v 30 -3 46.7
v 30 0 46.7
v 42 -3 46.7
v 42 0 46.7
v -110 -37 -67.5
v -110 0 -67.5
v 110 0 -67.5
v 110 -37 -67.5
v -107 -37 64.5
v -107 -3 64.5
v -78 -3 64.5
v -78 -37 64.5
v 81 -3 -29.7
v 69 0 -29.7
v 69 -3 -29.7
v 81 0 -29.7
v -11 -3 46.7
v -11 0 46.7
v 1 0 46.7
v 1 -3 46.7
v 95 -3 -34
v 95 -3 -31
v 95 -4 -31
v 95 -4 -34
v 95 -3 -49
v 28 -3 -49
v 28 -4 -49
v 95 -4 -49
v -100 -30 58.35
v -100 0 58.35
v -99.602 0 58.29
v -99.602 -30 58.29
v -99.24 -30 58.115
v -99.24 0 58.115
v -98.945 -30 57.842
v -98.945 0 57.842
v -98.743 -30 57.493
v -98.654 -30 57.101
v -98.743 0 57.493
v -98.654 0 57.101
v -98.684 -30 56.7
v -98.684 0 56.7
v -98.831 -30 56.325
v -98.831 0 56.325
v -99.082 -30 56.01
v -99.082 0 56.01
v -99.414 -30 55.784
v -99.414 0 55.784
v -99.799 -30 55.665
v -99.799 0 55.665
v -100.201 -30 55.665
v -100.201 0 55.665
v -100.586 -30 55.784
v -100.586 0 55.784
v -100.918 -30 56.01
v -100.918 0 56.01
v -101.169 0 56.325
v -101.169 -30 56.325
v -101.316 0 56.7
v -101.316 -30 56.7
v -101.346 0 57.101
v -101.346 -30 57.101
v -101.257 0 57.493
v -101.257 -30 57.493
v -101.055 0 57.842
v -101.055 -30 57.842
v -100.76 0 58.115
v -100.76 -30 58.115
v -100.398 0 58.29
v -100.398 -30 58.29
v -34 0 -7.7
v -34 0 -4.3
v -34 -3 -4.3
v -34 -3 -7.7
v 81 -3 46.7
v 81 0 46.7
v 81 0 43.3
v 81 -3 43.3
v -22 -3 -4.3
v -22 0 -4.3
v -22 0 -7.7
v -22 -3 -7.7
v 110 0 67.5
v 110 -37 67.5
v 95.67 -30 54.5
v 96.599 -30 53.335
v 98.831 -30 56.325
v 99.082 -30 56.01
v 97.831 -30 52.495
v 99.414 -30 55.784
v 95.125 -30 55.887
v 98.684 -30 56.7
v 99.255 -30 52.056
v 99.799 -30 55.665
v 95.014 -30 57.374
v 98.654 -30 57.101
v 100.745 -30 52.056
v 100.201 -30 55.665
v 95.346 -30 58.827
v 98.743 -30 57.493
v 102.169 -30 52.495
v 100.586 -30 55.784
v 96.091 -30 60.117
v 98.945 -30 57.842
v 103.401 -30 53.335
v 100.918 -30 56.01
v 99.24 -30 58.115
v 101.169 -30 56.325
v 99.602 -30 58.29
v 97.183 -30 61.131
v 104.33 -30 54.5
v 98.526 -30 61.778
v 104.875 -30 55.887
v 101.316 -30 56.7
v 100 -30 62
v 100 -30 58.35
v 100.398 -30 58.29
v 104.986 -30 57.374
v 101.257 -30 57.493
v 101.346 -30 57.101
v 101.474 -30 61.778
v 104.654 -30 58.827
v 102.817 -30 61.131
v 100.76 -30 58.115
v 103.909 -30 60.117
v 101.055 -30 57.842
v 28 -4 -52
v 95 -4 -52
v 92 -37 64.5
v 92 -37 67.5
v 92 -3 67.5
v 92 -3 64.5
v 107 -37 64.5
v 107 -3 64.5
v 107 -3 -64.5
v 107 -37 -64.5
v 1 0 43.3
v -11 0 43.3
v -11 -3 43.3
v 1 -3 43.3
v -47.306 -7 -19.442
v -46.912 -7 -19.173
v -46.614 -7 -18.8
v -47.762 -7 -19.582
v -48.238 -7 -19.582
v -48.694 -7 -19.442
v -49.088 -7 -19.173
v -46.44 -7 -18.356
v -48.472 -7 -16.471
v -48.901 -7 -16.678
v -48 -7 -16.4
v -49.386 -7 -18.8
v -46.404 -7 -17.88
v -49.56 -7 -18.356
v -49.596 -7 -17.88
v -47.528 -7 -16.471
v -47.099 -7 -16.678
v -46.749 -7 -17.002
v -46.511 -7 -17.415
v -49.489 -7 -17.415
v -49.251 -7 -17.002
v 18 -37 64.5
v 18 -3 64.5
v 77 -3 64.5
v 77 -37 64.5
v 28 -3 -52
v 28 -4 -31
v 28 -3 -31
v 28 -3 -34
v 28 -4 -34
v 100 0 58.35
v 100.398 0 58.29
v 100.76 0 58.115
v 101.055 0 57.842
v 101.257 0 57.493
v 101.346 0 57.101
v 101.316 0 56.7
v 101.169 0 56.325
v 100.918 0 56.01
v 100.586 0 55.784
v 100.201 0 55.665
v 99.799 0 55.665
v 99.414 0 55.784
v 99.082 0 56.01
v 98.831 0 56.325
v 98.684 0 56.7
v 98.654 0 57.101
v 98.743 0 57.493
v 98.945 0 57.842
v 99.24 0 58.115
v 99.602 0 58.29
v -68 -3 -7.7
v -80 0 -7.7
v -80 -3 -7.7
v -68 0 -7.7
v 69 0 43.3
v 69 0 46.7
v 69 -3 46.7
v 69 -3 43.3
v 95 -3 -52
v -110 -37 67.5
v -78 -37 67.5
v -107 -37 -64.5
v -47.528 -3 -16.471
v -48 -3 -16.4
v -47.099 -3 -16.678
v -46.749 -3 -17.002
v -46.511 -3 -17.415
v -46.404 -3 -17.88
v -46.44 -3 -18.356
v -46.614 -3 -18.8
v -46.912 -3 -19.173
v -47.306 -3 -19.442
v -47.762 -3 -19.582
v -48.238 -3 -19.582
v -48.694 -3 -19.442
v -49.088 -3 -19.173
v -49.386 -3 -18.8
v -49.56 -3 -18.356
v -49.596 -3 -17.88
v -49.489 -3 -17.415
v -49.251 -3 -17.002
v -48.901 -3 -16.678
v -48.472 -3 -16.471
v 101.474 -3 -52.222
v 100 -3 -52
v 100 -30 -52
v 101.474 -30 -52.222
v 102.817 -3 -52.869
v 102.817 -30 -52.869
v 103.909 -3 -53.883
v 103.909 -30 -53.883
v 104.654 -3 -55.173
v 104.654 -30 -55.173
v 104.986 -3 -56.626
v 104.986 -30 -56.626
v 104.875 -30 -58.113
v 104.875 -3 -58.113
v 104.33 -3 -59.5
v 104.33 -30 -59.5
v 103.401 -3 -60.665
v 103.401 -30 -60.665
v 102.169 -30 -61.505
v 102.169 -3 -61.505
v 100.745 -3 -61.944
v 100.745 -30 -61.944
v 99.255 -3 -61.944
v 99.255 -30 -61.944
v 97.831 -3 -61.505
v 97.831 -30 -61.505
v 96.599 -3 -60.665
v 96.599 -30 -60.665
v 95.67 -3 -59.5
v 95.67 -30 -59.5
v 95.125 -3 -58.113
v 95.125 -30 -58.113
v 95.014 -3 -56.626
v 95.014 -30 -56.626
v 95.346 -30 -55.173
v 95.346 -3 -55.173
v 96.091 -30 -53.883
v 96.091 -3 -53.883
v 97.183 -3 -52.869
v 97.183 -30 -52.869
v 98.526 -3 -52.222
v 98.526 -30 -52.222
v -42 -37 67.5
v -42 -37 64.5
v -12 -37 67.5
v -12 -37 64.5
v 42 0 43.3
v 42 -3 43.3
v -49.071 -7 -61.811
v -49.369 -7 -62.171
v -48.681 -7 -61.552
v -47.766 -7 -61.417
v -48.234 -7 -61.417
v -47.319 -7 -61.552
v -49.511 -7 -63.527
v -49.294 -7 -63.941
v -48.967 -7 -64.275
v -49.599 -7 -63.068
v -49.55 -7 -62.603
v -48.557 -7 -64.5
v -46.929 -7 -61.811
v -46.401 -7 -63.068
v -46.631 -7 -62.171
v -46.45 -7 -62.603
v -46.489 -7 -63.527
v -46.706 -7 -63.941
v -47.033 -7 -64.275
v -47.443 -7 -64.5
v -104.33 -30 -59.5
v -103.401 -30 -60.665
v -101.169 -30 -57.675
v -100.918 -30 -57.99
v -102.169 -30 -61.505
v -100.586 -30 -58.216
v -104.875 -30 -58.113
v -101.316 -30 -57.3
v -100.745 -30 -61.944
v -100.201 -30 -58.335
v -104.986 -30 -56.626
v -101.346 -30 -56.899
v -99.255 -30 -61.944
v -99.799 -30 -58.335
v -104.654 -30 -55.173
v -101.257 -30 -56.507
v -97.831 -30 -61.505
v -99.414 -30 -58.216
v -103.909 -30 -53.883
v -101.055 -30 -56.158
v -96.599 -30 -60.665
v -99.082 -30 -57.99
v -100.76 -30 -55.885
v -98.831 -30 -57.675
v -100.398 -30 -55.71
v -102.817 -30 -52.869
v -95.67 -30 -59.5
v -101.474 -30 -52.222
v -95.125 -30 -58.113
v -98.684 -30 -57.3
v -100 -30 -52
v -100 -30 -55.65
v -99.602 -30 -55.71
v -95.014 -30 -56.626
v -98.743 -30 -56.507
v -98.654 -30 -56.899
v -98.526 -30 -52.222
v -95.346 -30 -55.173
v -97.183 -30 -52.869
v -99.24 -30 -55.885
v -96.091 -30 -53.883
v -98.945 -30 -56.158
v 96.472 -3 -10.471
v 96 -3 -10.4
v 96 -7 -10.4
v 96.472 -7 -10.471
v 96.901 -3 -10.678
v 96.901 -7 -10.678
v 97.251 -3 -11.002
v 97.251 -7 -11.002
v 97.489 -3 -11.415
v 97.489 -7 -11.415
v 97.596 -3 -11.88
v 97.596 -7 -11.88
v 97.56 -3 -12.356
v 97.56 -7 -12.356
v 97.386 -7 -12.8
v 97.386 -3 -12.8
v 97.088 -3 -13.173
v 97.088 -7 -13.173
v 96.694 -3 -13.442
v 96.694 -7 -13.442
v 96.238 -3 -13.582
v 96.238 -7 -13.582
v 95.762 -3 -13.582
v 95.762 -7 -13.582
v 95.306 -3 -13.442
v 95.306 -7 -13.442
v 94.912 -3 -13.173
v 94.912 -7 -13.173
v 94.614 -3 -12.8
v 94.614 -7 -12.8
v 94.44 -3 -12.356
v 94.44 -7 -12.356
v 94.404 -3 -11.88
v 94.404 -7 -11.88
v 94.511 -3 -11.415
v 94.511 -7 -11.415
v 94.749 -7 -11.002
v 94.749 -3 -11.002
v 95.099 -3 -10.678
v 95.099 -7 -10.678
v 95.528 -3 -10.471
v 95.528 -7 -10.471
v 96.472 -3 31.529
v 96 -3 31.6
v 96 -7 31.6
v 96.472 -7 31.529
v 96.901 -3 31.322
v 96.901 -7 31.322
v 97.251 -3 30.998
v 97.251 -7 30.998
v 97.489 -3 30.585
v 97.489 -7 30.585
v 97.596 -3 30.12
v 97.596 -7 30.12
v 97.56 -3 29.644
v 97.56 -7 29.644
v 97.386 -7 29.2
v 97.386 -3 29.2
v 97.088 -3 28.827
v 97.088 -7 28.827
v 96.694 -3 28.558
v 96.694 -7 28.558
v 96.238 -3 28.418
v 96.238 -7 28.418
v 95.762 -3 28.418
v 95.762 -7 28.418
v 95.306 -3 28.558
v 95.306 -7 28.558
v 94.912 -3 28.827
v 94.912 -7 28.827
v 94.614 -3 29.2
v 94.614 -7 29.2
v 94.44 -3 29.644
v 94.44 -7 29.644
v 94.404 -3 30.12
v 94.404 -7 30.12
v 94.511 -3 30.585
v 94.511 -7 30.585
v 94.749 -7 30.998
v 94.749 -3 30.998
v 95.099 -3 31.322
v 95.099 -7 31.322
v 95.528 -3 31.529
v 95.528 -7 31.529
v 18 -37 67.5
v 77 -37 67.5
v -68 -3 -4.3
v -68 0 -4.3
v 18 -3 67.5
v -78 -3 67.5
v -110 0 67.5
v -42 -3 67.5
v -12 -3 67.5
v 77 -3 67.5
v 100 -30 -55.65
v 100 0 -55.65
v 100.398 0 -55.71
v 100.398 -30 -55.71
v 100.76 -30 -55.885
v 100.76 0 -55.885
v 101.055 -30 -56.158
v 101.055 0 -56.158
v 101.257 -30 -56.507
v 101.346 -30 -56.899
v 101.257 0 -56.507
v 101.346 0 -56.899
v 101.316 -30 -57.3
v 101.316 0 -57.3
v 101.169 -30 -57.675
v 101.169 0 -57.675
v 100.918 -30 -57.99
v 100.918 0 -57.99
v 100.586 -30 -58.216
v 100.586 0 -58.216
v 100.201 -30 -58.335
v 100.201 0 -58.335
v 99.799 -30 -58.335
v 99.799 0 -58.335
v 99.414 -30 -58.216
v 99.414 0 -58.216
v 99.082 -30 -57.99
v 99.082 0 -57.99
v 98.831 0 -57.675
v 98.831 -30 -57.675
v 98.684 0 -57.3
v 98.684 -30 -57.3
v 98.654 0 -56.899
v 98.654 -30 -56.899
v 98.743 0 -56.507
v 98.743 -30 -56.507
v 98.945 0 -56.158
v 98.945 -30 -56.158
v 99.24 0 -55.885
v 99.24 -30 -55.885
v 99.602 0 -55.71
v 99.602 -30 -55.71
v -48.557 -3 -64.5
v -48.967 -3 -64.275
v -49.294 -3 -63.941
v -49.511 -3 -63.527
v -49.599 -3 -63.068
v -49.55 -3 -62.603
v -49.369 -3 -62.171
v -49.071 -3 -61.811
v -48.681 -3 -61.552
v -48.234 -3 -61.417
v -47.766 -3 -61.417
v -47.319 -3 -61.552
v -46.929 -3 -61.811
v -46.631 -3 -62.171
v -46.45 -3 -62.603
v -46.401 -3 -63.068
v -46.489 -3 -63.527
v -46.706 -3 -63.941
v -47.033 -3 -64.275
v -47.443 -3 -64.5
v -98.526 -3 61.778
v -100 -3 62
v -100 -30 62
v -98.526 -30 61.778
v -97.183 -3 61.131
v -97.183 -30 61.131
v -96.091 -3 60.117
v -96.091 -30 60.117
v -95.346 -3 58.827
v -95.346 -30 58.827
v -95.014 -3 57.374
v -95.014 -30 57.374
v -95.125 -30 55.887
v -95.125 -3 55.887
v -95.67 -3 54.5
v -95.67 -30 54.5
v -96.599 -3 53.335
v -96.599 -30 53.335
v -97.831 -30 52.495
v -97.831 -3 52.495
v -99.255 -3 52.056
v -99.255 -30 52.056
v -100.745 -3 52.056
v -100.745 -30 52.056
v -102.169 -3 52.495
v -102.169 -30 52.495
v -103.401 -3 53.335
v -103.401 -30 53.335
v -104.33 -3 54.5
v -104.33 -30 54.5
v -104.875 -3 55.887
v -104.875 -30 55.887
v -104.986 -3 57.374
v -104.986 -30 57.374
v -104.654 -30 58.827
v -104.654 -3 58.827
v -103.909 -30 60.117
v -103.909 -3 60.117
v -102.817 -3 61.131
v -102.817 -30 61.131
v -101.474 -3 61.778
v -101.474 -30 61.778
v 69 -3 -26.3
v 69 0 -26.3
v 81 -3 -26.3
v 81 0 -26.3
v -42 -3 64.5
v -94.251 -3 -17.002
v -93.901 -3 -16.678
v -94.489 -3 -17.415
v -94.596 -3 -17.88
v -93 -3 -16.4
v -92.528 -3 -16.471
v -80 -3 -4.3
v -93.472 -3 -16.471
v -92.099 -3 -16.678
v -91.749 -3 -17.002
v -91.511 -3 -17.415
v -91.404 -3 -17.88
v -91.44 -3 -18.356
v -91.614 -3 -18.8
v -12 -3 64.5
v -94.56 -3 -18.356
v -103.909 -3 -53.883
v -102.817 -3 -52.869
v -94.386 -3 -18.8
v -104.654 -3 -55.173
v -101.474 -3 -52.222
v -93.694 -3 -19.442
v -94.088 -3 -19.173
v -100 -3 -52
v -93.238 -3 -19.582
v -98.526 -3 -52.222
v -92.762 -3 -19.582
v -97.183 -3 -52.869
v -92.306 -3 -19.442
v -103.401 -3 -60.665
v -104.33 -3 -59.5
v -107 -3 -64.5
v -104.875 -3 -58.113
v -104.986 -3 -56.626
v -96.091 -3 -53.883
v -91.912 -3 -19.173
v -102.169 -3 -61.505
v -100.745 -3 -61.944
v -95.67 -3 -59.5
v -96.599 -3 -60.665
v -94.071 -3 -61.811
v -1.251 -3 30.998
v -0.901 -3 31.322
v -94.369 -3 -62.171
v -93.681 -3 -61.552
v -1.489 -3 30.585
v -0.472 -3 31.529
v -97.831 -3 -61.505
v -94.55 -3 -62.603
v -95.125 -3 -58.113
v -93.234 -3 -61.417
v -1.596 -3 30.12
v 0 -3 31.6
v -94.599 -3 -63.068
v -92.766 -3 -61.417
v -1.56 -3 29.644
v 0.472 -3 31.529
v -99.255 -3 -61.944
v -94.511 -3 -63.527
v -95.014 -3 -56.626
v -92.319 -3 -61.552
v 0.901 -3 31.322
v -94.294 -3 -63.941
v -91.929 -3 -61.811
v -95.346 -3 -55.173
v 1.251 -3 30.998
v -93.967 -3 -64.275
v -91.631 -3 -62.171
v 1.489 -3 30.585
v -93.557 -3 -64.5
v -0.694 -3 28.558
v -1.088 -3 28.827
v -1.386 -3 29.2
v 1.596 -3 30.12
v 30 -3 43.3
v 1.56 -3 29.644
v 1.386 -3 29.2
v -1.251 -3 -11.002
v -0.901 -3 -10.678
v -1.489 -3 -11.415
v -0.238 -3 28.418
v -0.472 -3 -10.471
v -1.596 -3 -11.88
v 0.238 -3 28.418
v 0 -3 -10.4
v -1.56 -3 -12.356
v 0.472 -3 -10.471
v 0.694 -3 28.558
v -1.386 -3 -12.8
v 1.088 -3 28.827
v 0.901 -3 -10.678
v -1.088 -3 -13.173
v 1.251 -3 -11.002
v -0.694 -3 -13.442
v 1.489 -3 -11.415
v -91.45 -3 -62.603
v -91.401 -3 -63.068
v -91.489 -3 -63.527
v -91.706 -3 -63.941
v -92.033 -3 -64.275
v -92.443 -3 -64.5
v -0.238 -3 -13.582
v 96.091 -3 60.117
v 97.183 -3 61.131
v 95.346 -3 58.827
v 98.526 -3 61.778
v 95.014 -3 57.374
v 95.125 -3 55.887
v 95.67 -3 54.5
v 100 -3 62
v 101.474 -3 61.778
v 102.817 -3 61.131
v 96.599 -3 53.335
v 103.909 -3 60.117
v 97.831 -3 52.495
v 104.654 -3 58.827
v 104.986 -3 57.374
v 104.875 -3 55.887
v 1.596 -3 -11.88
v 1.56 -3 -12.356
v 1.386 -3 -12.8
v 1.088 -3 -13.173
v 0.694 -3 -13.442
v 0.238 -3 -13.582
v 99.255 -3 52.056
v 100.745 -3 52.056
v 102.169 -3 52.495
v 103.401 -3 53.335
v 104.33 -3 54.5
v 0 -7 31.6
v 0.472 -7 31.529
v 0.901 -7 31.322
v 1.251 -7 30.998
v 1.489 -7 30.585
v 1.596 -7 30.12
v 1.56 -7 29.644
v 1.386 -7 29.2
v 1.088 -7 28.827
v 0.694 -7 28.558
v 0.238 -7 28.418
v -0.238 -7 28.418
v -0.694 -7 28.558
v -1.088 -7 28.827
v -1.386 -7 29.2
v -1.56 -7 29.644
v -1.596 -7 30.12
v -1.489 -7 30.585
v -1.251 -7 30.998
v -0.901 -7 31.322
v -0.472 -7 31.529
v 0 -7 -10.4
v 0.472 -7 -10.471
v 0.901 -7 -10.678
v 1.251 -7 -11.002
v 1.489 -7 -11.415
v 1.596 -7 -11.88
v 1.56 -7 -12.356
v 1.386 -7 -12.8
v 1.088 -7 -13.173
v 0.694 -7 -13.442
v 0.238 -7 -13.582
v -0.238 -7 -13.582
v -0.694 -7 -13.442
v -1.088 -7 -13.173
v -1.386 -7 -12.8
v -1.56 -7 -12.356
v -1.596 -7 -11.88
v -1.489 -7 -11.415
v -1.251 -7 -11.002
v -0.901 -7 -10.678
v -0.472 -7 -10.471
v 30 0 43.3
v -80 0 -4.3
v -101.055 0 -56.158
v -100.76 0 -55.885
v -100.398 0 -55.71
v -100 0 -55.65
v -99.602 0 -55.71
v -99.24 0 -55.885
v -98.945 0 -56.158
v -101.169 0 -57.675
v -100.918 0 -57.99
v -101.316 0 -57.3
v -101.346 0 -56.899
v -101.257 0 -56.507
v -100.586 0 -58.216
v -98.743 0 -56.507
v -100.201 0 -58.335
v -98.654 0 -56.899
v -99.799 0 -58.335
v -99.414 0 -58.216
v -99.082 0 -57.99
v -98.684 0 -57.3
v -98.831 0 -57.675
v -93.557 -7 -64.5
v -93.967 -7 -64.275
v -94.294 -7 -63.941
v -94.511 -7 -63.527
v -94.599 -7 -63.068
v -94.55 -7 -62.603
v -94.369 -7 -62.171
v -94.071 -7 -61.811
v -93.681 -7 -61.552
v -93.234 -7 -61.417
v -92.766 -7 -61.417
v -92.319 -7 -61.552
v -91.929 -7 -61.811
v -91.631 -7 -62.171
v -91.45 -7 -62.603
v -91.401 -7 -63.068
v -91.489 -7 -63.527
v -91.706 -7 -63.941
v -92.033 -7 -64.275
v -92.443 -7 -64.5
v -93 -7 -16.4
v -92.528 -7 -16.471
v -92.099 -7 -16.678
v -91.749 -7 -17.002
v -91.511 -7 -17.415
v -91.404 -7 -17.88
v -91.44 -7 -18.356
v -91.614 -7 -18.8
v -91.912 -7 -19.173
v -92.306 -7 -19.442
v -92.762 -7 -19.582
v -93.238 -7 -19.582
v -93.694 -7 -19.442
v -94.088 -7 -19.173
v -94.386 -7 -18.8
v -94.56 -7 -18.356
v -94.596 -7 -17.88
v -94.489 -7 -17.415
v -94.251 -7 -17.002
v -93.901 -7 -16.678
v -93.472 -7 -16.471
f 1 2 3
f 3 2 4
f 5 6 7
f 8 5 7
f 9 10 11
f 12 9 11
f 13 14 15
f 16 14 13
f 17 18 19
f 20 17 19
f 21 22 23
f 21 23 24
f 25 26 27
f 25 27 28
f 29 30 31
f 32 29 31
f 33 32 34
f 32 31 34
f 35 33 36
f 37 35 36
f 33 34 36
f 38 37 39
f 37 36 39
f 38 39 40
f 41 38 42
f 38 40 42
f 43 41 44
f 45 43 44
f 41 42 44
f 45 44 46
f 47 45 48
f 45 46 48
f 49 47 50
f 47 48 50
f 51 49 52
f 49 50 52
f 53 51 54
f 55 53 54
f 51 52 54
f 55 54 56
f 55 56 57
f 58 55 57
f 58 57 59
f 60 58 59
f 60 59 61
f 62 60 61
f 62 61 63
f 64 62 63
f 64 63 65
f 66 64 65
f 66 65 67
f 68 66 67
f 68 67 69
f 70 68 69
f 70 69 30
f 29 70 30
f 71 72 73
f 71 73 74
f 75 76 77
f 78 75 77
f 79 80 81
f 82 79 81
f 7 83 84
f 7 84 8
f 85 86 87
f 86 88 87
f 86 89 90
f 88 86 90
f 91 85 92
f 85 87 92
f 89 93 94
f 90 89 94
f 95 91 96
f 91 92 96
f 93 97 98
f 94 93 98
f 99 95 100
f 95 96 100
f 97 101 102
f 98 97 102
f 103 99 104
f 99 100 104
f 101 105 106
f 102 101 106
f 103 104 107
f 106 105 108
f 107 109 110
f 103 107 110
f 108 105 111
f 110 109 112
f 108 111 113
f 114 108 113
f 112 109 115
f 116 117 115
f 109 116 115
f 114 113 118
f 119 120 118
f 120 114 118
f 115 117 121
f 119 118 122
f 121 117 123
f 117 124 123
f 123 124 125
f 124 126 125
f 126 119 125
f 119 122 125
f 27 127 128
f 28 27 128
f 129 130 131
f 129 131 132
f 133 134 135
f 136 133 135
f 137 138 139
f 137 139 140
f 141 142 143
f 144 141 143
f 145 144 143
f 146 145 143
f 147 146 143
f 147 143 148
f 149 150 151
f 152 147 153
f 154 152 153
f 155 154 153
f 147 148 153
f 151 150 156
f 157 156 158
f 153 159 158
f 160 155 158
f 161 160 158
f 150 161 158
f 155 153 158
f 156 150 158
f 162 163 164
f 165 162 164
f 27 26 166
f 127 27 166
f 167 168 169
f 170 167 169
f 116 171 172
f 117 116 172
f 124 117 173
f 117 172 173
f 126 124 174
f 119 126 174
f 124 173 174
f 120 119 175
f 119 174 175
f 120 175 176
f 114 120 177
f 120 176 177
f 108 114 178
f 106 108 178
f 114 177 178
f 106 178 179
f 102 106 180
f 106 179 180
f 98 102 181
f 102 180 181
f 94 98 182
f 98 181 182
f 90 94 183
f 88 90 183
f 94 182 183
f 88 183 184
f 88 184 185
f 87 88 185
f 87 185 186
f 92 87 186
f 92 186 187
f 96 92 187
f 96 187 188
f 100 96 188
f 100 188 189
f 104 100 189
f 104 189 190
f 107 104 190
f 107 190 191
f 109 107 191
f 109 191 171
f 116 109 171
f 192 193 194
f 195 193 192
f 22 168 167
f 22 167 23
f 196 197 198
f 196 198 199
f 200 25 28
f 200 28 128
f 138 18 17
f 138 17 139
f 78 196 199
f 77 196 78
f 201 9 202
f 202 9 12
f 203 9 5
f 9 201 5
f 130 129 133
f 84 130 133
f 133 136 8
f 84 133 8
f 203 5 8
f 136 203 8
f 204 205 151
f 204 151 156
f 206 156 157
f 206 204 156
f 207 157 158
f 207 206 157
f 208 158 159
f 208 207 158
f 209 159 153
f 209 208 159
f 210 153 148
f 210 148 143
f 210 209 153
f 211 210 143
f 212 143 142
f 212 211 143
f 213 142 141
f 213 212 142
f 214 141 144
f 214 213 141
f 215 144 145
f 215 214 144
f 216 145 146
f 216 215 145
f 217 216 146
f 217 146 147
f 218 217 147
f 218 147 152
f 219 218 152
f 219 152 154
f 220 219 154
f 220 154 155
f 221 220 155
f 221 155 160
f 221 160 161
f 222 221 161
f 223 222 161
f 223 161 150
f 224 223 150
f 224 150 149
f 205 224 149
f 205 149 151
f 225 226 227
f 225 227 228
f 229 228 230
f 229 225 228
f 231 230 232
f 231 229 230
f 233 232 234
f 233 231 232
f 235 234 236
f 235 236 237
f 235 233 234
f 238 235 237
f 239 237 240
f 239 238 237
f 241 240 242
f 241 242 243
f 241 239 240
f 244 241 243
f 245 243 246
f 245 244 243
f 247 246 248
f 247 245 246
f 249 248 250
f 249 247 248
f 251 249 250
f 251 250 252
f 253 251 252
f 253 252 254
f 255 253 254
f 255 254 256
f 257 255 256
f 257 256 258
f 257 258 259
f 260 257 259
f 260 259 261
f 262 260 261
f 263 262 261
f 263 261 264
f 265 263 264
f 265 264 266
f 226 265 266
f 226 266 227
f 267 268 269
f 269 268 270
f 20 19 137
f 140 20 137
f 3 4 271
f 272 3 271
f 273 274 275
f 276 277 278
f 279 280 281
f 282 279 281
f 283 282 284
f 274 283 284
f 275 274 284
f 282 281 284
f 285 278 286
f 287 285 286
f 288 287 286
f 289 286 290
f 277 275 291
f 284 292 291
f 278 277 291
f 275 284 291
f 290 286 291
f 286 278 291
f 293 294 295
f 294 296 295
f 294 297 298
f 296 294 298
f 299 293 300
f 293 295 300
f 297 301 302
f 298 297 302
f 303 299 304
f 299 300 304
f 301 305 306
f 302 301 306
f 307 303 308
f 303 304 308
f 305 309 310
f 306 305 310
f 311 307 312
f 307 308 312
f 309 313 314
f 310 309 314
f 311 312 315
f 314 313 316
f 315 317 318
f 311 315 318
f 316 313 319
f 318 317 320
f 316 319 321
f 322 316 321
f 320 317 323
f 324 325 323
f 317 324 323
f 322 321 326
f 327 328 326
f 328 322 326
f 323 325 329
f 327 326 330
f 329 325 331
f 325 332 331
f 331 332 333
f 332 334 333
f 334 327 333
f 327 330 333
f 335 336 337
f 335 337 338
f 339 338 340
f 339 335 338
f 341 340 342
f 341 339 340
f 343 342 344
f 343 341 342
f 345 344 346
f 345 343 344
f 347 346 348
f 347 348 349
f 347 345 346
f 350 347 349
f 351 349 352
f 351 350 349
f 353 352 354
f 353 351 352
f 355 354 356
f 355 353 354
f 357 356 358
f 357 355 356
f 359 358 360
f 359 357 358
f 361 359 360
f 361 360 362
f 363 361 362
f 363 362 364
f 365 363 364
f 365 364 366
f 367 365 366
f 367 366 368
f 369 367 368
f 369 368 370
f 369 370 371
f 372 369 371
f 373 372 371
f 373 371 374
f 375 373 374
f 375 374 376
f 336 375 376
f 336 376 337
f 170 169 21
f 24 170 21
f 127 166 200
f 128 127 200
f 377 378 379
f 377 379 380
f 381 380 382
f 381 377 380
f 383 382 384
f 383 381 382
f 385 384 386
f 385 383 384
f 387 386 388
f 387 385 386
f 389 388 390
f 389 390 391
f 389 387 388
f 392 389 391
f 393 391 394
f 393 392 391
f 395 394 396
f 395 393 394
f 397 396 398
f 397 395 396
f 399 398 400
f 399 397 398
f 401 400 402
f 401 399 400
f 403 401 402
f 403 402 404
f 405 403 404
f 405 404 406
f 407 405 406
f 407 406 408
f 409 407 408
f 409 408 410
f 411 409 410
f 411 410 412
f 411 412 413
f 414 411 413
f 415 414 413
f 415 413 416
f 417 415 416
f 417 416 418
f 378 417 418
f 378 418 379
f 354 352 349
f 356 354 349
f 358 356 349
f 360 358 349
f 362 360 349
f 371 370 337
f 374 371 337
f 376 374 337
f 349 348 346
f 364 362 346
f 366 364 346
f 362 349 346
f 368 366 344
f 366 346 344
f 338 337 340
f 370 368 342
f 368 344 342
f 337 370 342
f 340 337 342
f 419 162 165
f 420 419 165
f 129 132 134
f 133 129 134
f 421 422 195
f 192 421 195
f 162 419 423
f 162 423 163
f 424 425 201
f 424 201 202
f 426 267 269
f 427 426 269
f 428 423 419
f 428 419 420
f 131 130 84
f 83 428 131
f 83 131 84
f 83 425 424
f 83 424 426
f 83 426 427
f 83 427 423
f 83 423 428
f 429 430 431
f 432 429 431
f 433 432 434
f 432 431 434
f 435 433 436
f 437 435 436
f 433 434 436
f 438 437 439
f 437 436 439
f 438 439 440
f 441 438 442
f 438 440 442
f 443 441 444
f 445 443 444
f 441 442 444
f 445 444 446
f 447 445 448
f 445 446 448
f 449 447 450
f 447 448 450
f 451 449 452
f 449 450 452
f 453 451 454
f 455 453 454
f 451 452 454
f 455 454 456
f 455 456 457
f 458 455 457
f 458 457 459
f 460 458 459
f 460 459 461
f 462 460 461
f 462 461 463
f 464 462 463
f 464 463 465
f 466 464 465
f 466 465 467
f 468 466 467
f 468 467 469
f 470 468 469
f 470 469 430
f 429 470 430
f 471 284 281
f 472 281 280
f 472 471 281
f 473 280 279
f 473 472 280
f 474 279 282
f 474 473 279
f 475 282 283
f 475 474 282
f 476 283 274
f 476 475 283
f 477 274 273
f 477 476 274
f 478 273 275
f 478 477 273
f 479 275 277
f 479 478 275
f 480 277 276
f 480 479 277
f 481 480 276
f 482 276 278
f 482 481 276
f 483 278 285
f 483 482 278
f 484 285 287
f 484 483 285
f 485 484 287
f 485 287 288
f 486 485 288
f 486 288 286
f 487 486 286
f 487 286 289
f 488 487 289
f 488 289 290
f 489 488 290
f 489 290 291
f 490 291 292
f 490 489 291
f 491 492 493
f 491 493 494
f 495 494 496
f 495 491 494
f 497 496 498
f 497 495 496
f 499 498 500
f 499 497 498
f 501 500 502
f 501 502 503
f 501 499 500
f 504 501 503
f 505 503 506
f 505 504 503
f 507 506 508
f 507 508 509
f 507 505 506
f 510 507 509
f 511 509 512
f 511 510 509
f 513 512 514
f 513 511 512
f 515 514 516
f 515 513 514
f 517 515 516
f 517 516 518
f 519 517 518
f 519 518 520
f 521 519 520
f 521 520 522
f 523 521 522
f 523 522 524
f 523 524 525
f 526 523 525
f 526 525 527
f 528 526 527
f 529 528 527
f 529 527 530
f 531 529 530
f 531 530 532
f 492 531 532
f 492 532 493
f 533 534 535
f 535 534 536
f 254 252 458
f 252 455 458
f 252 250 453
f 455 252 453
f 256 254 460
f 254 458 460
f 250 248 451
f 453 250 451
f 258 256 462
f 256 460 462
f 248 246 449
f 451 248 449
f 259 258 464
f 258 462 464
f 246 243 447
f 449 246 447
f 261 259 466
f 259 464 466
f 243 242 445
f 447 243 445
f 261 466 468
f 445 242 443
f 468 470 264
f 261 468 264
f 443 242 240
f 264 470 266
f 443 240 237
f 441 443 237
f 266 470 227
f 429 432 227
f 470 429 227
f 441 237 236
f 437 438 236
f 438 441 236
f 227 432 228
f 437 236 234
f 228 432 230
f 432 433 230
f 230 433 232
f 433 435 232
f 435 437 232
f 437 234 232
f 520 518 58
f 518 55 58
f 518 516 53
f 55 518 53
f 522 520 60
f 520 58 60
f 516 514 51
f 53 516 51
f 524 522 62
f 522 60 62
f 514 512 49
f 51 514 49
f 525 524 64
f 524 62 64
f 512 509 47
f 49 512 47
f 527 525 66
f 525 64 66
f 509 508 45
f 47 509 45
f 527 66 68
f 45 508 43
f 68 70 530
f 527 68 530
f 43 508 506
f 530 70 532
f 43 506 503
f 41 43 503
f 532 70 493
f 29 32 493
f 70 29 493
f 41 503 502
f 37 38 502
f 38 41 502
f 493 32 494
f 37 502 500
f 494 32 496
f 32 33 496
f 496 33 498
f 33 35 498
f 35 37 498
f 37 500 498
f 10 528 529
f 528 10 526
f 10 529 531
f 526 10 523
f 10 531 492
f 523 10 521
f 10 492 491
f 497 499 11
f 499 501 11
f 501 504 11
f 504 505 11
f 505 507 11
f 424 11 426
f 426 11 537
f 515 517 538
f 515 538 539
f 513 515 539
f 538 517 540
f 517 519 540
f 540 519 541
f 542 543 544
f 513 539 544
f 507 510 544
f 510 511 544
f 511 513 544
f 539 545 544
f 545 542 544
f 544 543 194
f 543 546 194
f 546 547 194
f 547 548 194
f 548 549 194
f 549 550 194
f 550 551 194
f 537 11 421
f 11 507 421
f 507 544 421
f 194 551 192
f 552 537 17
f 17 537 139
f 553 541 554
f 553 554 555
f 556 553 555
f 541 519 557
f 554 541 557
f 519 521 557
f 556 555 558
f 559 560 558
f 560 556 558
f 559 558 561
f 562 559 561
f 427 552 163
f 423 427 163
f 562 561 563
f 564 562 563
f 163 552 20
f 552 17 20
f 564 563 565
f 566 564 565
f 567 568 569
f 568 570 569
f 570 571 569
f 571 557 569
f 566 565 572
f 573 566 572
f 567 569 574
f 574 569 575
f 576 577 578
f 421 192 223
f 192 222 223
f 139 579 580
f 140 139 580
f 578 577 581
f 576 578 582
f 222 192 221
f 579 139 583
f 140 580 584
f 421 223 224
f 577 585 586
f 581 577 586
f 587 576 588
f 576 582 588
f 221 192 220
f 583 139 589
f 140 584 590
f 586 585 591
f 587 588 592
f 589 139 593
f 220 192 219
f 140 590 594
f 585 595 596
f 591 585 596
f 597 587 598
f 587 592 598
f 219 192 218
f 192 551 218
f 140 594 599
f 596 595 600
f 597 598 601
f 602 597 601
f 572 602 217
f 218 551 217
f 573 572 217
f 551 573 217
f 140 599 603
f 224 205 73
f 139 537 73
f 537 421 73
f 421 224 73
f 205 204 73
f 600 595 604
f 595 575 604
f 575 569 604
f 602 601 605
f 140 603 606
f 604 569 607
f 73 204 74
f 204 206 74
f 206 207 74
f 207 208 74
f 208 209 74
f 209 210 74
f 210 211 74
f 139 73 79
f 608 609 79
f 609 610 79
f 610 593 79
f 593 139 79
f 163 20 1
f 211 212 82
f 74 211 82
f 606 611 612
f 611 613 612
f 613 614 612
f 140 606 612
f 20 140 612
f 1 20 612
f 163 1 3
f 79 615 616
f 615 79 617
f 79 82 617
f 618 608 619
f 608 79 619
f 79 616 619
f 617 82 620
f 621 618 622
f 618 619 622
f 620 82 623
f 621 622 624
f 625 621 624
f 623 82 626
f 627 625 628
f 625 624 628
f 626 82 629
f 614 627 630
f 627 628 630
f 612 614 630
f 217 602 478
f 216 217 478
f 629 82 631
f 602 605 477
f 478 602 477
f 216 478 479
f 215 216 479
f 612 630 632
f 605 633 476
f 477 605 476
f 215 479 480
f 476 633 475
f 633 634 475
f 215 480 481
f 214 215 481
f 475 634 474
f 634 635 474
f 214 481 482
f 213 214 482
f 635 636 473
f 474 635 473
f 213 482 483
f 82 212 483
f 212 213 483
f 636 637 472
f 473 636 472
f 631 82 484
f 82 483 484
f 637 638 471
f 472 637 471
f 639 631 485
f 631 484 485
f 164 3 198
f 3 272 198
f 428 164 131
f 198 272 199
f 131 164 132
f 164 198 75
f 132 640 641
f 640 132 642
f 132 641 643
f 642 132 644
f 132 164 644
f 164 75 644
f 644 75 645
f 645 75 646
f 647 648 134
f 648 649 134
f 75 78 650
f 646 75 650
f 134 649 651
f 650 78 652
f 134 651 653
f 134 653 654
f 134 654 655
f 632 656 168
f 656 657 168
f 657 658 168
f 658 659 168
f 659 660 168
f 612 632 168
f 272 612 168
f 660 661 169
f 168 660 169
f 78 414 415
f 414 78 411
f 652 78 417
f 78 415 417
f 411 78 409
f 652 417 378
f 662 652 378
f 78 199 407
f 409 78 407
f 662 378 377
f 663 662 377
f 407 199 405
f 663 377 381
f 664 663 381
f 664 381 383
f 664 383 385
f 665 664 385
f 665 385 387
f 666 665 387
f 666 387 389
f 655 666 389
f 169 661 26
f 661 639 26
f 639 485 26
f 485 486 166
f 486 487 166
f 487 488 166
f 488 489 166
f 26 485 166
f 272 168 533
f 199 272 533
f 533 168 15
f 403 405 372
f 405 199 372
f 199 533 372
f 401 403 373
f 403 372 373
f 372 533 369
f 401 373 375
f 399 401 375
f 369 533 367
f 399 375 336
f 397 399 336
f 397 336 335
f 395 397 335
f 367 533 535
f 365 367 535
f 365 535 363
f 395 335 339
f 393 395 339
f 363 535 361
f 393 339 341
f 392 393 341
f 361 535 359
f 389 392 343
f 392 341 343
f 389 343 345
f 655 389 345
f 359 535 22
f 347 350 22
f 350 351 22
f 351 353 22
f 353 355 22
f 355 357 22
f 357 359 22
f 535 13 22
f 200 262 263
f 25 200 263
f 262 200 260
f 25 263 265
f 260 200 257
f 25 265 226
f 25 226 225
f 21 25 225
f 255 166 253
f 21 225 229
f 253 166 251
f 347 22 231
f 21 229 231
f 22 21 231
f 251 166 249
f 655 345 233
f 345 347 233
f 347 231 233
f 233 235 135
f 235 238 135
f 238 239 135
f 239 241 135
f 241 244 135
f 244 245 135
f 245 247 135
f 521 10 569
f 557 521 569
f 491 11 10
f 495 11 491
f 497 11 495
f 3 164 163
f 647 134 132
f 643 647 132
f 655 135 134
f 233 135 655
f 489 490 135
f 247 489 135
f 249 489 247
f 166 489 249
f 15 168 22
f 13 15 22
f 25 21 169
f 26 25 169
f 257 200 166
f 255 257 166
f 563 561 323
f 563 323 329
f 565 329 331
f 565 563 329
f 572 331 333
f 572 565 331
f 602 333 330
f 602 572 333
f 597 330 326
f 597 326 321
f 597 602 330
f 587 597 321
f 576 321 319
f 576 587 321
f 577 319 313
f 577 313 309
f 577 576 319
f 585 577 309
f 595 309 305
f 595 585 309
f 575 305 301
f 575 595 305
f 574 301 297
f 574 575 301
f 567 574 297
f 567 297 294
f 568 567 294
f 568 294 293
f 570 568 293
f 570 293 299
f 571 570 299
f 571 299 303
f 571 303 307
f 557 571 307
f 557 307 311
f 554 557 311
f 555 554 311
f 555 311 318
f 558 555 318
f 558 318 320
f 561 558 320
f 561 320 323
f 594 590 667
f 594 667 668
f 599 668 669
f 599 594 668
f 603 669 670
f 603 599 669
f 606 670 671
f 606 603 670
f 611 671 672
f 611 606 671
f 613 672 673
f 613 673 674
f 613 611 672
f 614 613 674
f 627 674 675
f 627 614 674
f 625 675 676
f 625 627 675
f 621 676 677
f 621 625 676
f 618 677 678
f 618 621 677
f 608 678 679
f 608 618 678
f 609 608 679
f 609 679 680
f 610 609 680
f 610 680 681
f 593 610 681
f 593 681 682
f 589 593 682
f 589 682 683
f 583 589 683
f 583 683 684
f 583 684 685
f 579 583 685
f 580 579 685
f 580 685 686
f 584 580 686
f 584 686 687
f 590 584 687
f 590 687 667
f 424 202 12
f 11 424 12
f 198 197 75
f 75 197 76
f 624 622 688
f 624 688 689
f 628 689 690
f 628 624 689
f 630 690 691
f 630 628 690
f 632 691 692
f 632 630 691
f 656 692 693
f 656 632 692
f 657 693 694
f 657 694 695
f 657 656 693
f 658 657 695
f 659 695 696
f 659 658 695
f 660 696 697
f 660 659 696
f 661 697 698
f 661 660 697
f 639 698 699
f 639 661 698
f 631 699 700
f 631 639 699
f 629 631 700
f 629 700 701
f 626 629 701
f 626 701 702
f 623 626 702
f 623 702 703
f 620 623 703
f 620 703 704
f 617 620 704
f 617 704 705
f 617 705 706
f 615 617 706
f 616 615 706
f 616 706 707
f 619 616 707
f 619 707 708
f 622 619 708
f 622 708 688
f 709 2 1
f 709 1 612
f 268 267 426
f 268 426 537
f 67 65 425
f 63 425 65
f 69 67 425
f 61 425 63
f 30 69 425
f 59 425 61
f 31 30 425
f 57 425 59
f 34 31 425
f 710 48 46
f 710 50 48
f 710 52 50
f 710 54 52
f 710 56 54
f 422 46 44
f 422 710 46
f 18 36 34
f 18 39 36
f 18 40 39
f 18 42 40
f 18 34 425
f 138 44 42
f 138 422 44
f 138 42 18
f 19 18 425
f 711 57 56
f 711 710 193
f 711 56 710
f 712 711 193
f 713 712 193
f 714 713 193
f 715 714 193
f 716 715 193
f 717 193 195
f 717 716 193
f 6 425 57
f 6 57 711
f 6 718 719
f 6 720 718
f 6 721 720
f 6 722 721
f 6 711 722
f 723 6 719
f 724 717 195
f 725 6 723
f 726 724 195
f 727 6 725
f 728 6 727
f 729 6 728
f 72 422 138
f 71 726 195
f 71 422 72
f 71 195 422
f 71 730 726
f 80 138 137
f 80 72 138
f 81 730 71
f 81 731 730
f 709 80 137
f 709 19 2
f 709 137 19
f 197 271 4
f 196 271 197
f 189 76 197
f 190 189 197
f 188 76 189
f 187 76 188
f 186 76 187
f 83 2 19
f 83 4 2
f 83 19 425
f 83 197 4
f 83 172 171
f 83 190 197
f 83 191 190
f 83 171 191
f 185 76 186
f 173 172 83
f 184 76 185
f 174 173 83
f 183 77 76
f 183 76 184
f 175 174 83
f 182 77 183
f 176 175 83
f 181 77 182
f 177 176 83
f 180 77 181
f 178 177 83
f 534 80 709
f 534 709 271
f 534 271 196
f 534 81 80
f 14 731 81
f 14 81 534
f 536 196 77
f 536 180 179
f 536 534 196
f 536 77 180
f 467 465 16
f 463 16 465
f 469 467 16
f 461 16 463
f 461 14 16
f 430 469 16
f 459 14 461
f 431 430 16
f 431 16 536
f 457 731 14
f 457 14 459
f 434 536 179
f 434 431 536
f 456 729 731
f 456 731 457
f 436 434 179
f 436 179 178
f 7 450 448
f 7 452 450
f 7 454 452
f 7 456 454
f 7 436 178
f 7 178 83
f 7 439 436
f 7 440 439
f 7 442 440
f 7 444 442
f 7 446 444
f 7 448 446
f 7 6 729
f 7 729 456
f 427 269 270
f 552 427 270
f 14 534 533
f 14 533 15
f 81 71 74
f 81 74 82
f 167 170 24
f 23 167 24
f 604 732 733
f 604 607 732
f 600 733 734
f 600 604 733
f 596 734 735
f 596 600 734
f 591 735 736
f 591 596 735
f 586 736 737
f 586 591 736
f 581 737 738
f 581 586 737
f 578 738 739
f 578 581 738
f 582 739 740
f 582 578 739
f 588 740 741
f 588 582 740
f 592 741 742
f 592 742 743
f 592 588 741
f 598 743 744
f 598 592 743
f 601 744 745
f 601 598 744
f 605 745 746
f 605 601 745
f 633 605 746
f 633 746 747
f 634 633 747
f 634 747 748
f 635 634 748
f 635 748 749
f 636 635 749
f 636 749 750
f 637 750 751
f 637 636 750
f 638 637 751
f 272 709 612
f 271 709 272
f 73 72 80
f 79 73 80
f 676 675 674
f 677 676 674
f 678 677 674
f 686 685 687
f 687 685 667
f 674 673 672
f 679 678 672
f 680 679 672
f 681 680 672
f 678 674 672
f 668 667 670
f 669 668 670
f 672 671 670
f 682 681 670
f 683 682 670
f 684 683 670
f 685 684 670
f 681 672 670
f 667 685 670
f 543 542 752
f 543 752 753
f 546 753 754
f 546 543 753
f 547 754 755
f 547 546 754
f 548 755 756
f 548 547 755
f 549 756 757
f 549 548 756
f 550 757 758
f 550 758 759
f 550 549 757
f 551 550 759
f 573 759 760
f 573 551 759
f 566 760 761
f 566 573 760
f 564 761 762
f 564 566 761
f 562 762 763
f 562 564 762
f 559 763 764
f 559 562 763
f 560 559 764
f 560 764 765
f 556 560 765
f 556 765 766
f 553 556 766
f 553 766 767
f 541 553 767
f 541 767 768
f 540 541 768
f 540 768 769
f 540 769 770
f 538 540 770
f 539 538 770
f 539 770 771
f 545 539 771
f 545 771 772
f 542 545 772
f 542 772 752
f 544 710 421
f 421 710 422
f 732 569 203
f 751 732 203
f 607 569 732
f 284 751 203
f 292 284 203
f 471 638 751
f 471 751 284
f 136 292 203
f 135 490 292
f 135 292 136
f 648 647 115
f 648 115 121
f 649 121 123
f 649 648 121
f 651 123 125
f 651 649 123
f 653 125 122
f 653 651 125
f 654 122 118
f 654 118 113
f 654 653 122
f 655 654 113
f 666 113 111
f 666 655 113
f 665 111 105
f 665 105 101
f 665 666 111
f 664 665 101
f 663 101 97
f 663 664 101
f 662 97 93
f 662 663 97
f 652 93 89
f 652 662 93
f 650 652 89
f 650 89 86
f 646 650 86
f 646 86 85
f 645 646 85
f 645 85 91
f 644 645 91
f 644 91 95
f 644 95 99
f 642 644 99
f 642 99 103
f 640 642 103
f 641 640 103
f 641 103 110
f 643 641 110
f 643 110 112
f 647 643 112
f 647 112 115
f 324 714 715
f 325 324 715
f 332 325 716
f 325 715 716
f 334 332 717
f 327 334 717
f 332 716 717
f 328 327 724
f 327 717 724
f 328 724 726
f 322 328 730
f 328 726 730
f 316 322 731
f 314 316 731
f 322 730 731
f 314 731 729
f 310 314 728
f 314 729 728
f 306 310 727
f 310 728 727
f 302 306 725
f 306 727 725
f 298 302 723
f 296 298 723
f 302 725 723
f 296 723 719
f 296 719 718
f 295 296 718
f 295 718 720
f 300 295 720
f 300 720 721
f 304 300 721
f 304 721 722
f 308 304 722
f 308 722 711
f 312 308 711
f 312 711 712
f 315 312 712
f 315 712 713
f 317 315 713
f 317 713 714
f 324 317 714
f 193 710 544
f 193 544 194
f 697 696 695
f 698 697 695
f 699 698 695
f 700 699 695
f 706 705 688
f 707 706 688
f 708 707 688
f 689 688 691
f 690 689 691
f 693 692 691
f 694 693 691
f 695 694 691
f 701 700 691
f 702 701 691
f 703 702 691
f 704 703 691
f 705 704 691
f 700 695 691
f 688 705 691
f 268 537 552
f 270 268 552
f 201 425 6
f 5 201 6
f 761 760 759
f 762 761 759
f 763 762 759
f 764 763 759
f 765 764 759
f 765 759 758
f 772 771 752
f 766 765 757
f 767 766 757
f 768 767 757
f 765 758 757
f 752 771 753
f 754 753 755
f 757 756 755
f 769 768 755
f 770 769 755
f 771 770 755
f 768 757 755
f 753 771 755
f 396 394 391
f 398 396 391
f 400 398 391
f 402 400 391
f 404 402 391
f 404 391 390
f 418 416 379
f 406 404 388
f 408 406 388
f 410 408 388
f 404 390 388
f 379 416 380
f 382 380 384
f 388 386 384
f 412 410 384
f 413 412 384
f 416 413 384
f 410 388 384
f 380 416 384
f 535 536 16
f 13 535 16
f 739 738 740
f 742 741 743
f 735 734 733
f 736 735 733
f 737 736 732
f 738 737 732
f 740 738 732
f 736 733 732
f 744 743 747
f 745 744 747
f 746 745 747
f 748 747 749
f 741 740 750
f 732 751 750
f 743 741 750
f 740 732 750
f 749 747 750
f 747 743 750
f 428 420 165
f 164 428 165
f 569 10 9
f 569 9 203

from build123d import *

# Parameters (mm, degrees)
SKETCH_1_W                     = 220
SKETCH_1_H                     = 135
BASE_FLOOR_3MM_DEPTH           = 3
SKETCH_2_W                     = 220
SKETCH_2_H                     = 3
BACK_WALL_DEPTH                = 37
SKETCH_3_W                     = 3
SKETCH_3_H                     = 132
LEFT_WALL_DEPTH                = 37
SKETCH_4_W                     = 3
SKETCH_4_H                     = 132
RIGHT_WALL_DEPTH               = 37
SKETCH_5_W                     = 32
SKETCH_5_H                     = 3
FRONT_LEFT_WALL_DEPTH          = 37
SKETCH_6_W                     = 30
SKETCH_6_H                     = 3
FRONT_CAMERA_BRIDGE_DEPTH      = 37
SKETCH_7_W                     = 59
SKETCH_7_H                     = 3
FRONT_SR04_BRIDGE_DEPTH        = 37
SKETCH_8_W                     = 18
SKETCH_8_H                     = 3
FRONT_RIGHT_WALL_DEPTH         = 37
SKETCH_9_R                     = 5
LID_BOSS_1_DEPTH               = 30
SKETCH_10_R                    = 1.35
LID_BOSS_1_PILOT_DEPTH         = 34
SKETCH_11_R                    = 5
LID_BOSS_2_DEPTH               = 30
SKETCH_12_R                    = 1.35
LID_BOSS_2_PILOT_DEPTH         = 34
SKETCH_13_R                    = 5
LID_BOSS_3_DEPTH               = 30
SKETCH_14_R                    = 1.35
LID_BOSS_3_PILOT_DEPTH         = 34
SKETCH_15_R                    = 5
LID_BOSS_4_DEPTH               = 30
SKETCH_16_R                    = 1.35
LID_BOSS_4_PILOT_DEPTH         = 34
SKETCH_17_R                    = 1.6
P4_NANO_PEG_1_DEPTH            = 7
SKETCH_18_R                    = 1.6
P4_NANO_PEG_2_DEPTH            = 7
SKETCH_19_R                    = 1.6
P4_NANO_PEG_3_DEPTH            = 7
SKETCH_20_R                    = 1.6
P4_NANO_PEG_4_DEPTH            = 7
SKETCH_21_R                    = 1.6
MEGA_PEG_1_DEPTH               = 7
SKETCH_22_R                    = 1.6
MEGA_PEG_2_DEPTH               = 7
SKETCH_23_R                    = 1.6
MEGA_PEG_3_DEPTH               = 7
SKETCH_24_R                    = 1.6
MEGA_PEG_4_DEPTH               = 7
SKETCH_25_W                    = 12
SKETCH_25_H                    = 3.4
CABLE_TIE_SLOT_1_DEPTH         = 4
SKETCH_26_W                    = 12
SKETCH_26_H                    = 3.4
CABLE_TIE_SLOT_2_DEPTH         = 4
SKETCH_27_W                    = 12
SKETCH_27_H                    = 3.4
CABLE_TIE_SLOT_3_DEPTH         = 4
SKETCH_28_W                    = 12
SKETCH_28_H                    = 3.4
CABLE_TIE_SLOT_4_DEPTH         = 4
SKETCH_29_W                    = 12
SKETCH_29_H                    = 3.4
CABLE_TIE_SLOT_5_DEPTH         = 4
SKETCH_30_W                    = 12
SKETCH_30_H                    = 3.4
CABLE_TIE_SLOT_6_DEPTH         = 4
SKETCH_31_W                    = 67
SKETCH_31_H                    = 3
ADJUSTABLE_SENSOR_RAIL_1_DEPTH = 4
SKETCH_32_W                    = 67
SKETCH_32_H                    = 3
ADJUSTABLE_SENSOR_RAIL_2_DEPTH = 4


with BuildPart() as part:
    # 草图1 → Base_Floor_3mm (new body)
    with BuildSketch(Plane(origin=(0, 0, 0), x_dir=(1, 0, 0), z_dir=(0, 1, 0))):
        Rectangle(SKETCH_1_W, SKETCH_1_H)
    extrude(amount=-BASE_FLOOR_3MM_DEPTH)

    # 草图2 → Back_Wall (add)
    with BuildSketch(Plane(origin=(0, 0, 0), x_dir=(1, 0, 0), z_dir=(0, 1, 0))):
        with Locations((0, 66)):
            Rectangle(SKETCH_2_W, SKETCH_2_H)
    extrude(amount=-BACK_WALL_DEPTH)

    # 草图3 → Left_Wall (add)
    with BuildSketch(Plane(origin=(0, 0, 0), x_dir=(1, 0, 0), z_dir=(0, 1, 0))):
        with Locations((-108.5, -1.5)):
            Rectangle(SKETCH_3_W, SKETCH_3_H)
    extrude(amount=-LEFT_WALL_DEPTH)

    # 草图4 → Right_Wall (add)
    with BuildSketch(Plane(origin=(0, 0, 0), x_dir=(1, 0, 0), z_dir=(0, 1, 0))):
        with Locations((108.5, -1.5)):
            Rectangle(SKETCH_4_W, SKETCH_4_H)
    extrude(amount=-RIGHT_WALL_DEPTH)

    # 草图5 → Front_Left_Wall (add)
    with BuildSketch(Plane(origin=(0, 0, 0), x_dir=(1, 0, 0), z_dir=(0, 1, 0))):
        with Locations((-94, -66)):
            Rectangle(SKETCH_5_W, SKETCH_5_H)
    extrude(amount=-FRONT_LEFT_WALL_DEPTH)

    # 草图6 → Front_Camera_Bridge (add)
    with BuildSketch(Plane(origin=(0, 0, 0), x_dir=(1, 0, 0), z_dir=(0, 1, 0))):
        with Locations((-27, -66)):
            Rectangle(SKETCH_6_W, SKETCH_6_H)
    extrude(amount=-FRONT_CAMERA_BRIDGE_DEPTH)

    # 草图7 → Front_SR04_Bridge (add)
    with BuildSketch(Plane(origin=(0, 0, 0), x_dir=(1, 0, 0), z_dir=(0, 1, 0))):
        with Locations((47.5, -66)):
            Rectangle(SKETCH_7_W, SKETCH_7_H)
    extrude(amount=-FRONT_SR04_BRIDGE_DEPTH)

    # 草图8 → Front_Right_Wall (add)
    with BuildSketch(Plane(origin=(0, 0, 0), x_dir=(1, 0, 0), z_dir=(0, 1, 0))):
        with Locations((101, -66)):
            Rectangle(SKETCH_8_W, SKETCH_8_H)
    extrude(amount=-FRONT_RIGHT_WALL_DEPTH)

    # 草图9 → Lid_Boss_1 (add)
    with BuildSketch(Plane(origin=(0, 0, 0), x_dir=(1, 0, 0), z_dir=(0, 1, 0))):
        with Locations(Location((-100, -57, 0), (0, 0, 270))):
            Circle(SKETCH_9_R)
    extrude(amount=-LID_BOSS_1_DEPTH)

    # 草图10 → Lid_Boss_1_Pilot (cut)
    with BuildSketch(Plane(origin=(0, 0, 0), x_dir=(1, 0, 0), z_dir=(0, 1, 0))):
        with Locations(Location((-100, -57, 0), (0, 0, 270))):
            Circle(SKETCH_10_R)
    extrude(amount=-LID_BOSS_1_PILOT_DEPTH, mode=Mode.SUBTRACT)

    # 草图11 → Lid_Boss_2 (add)
    with BuildSketch(Plane(origin=(0, 0, 0), x_dir=(1, 0, 0), z_dir=(0, 1, 0))):
        with Locations(Location((100, -57, 0), (0, 0, 270))):
            Circle(SKETCH_11_R)
    extrude(amount=-LID_BOSS_2_DEPTH)

    # 草图12 → Lid_Boss_2_Pilot (cut)
    with BuildSketch(Plane(origin=(0, 0, 0), x_dir=(1, 0, 0), z_dir=(0, 1, 0))):
        with Locations(Location((100, -57, 0), (0, 0, 270))):
            Circle(SKETCH_12_R)
    extrude(amount=-LID_BOSS_2_PILOT_DEPTH, mode=Mode.SUBTRACT)

    # 草图13 → Lid_Boss_3 (add)
    with BuildSketch(Plane(origin=(0, 0, 0), x_dir=(1, 0, 0), z_dir=(0, 1, 0))):
        with Locations(Location((-100, 57, 0), (0, 0, 270))):
            Circle(SKETCH_13_R)
    extrude(amount=-LID_BOSS_3_DEPTH)

    # 草图14 → Lid_Boss_3_Pilot (cut)
    with BuildSketch(Plane(origin=(0, 0, 0), x_dir=(1, 0, 0), z_dir=(0, 1, 0))):
        with Locations(Location((-100, 57, 0), (0, 0, 270))):
            Circle(SKETCH_14_R)
    extrude(amount=-LID_BOSS_3_PILOT_DEPTH, mode=Mode.SUBTRACT)

    # 草图15 → Lid_Boss_4 (add)
    with BuildSketch(Plane(origin=(0, 0, 0), x_dir=(1, 0, 0), z_dir=(0, 1, 0))):
        with Locations(Location((100, 57, 0), (0, 0, 270))):
            Circle(SKETCH_15_R)
    extrude(amount=-LID_BOSS_4_DEPTH)

    # 草图16 → Lid_Boss_4_Pilot (cut)
    with BuildSketch(Plane(origin=(0, 0, 0), x_dir=(1, 0, 0), z_dir=(0, 1, 0))):
        with Locations(Location((100, 57, 0), (0, 0, 270))):
            Circle(SKETCH_16_R)
    extrude(amount=-LID_BOSS_4_PILOT_DEPTH, mode=Mode.SUBTRACT)

    # 草图17 → P4_NANO_Peg_1 (add)
    with BuildSketch(Plane(origin=(0, 0, 0), x_dir=(1, 0, 0), z_dir=(0, 1, 0))):
        with Locations(Location((-93, 18, 0), (0, 0, 270))):
            Circle(SKETCH_17_R)
    extrude(amount=-P4_NANO_PEG_1_DEPTH)

    # 草图18 → P4_NANO_Peg_2 (add)
    with BuildSketch(Plane(origin=(0, 0, 0), x_dir=(1, 0, 0), z_dir=(0, 1, 0))):
        with Locations(Location((-48, 18, 0), (0, 0, 270))):
            Circle(SKETCH_18_R)
    extrude(amount=-P4_NANO_PEG_2_DEPTH)

    # 草图19 → P4_NANO_Peg_3 (add)
    with BuildSketch(Plane(origin=(0, 0, 0), x_dir=(1, 0, 0), z_dir=(0, 1, 0))):
        with Locations((-93, 63)):
            Circle(SKETCH_19_R)
    extrude(amount=-P4_NANO_PEG_3_DEPTH)

    # 草图20 → P4_NANO_Peg_4 (add)
    with BuildSketch(Plane(origin=(0, 0, 0), x_dir=(1, 0, 0), z_dir=(0, 1, 0))):
        with Locations((-48, 63)):
            Circle(SKETCH_20_R)
    extrude(amount=-P4_NANO_PEG_4_DEPTH)

    # 草图21 → Mega_Peg_1 (add)
    with BuildSketch(Plane(origin=(0, 0, 0), x_dir=(1, 0, 0), z_dir=(0, 1, 0))):
        with Locations(Location((0, -30, 0), (0, 0, 270))):
            Circle(SKETCH_21_R)
    extrude(amount=-MEGA_PEG_1_DEPTH)

    # 草图22 → Mega_Peg_2 (add)
    with BuildSketch(Plane(origin=(0, 0, 0), x_dir=(1, 0, 0), z_dir=(0, 1, 0))):
        with Locations(Location((96, -30, 0), (0, 0, 270))):
            Circle(SKETCH_22_R)
    extrude(amount=-MEGA_PEG_2_DEPTH)

    # 草图23 → Mega_Peg_3 (add)
    with BuildSketch(Plane(origin=(0, 0, 0), x_dir=(1, 0, 0), z_dir=(0, 1, 0))):
        with Locations(Location((0, 12, 0), (0, 0, 270))):
            Circle(SKETCH_23_R)
    extrude(amount=-MEGA_PEG_3_DEPTH)

    # 草图24 → Mega_Peg_4 (add)
    with BuildSketch(Plane(origin=(0, 0, 0), x_dir=(1, 0, 0), z_dir=(0, 1, 0))):
        with Locations(Location((96, 12, 0), (0, 0, 270))):
            Circle(SKETCH_24_R)
    extrude(amount=-MEGA_PEG_4_DEPTH)

    # 草图25 → Cable_Tie_Slot_1 (cut)
    with BuildSketch(Plane(origin=(0, 0, 0), x_dir=(1, 0, 0), z_dir=(0, 1, 0))):
        with Locations((-74, 6)):
            Rectangle(SKETCH_25_W, SKETCH_25_H)
    extrude(amount=-CABLE_TIE_SLOT_1_DEPTH, mode=Mode.SUBTRACT)

    # 草图26 → Cable_Tie_Slot_2 (cut)
    with BuildSketch(Plane(origin=(0, 0, 0), x_dir=(1, 0, 0), z_dir=(0, 1, 0))):
        with Locations((-28, 6)):
            Rectangle(SKETCH_26_W, SKETCH_26_H)
    extrude(amount=-CABLE_TIE_SLOT_2_DEPTH, mode=Mode.SUBTRACT)

    # 草图27 → Cable_Tie_Slot_3 (cut)
    with BuildSketch(Plane(origin=(0, 0, 0), x_dir=(1, 0, 0), z_dir=(0, 1, 0))):
        with Locations((-5, -45)):
            Rectangle(SKETCH_27_W, SKETCH_27_H)
    extrude(amount=-CABLE_TIE_SLOT_3_DEPTH, mode=Mode.SUBTRACT)

    # 草图28 → Cable_Tie_Slot_4 (cut)
    with BuildSketch(Plane(origin=(0, 0, 0), x_dir=(1, 0, 0), z_dir=(0, 1, 0))):
        with Locations((36, -45)):
            Rectangle(SKETCH_28_W, SKETCH_28_H)
    extrude(amount=-CABLE_TIE_SLOT_4_DEPTH, mode=Mode.SUBTRACT)

    # 草图29 → Cable_Tie_Slot_5 (cut)
    with BuildSketch(Plane(origin=(0, 0, 0), x_dir=(1, 0, 0), z_dir=(0, 1, 0))):
        with Locations((75, -45)):
            Rectangle(SKETCH_29_W, SKETCH_29_H)
    extrude(amount=-CABLE_TIE_SLOT_5_DEPTH, mode=Mode.SUBTRACT)

    # 草图30 → Cable_Tie_Slot_6 (cut)
    with BuildSketch(Plane(origin=(0, 0, 0), x_dir=(1, 0, 0), z_dir=(0, 1, 0))):
        with Locations((75, 28)):
            Rectangle(SKETCH_30_W, SKETCH_30_H)
    extrude(amount=-CABLE_TIE_SLOT_6_DEPTH, mode=Mode.SUBTRACT)

    # 草图31 → Adjustable_Sensor_Rail_1 (add)
    with BuildSketch(Plane(origin=(0, 0, 0), x_dir=(1, 0, 0), z_dir=(0, 1, 0))):
        with Locations((61.5, 32.5)):
            Rectangle(SKETCH_31_W, SKETCH_31_H)
    extrude(amount=-ADJUSTABLE_SENSOR_RAIL_1_DEPTH)

    # 草图32 → Adjustable_Sensor_Rail_2 (add)
    with BuildSketch(Plane(origin=(0, 0, 0), x_dir=(1, 0, 0), z_dir=(0, 1, 0))):
        with Locations((61.5, 50.5)):
            Rectangle(SKETCH_32_W, SKETCH_32_H)
    extrude(amount=-ADJUSTABLE_SENSOR_RAIL_2_DEPTH)


solid = part.part
